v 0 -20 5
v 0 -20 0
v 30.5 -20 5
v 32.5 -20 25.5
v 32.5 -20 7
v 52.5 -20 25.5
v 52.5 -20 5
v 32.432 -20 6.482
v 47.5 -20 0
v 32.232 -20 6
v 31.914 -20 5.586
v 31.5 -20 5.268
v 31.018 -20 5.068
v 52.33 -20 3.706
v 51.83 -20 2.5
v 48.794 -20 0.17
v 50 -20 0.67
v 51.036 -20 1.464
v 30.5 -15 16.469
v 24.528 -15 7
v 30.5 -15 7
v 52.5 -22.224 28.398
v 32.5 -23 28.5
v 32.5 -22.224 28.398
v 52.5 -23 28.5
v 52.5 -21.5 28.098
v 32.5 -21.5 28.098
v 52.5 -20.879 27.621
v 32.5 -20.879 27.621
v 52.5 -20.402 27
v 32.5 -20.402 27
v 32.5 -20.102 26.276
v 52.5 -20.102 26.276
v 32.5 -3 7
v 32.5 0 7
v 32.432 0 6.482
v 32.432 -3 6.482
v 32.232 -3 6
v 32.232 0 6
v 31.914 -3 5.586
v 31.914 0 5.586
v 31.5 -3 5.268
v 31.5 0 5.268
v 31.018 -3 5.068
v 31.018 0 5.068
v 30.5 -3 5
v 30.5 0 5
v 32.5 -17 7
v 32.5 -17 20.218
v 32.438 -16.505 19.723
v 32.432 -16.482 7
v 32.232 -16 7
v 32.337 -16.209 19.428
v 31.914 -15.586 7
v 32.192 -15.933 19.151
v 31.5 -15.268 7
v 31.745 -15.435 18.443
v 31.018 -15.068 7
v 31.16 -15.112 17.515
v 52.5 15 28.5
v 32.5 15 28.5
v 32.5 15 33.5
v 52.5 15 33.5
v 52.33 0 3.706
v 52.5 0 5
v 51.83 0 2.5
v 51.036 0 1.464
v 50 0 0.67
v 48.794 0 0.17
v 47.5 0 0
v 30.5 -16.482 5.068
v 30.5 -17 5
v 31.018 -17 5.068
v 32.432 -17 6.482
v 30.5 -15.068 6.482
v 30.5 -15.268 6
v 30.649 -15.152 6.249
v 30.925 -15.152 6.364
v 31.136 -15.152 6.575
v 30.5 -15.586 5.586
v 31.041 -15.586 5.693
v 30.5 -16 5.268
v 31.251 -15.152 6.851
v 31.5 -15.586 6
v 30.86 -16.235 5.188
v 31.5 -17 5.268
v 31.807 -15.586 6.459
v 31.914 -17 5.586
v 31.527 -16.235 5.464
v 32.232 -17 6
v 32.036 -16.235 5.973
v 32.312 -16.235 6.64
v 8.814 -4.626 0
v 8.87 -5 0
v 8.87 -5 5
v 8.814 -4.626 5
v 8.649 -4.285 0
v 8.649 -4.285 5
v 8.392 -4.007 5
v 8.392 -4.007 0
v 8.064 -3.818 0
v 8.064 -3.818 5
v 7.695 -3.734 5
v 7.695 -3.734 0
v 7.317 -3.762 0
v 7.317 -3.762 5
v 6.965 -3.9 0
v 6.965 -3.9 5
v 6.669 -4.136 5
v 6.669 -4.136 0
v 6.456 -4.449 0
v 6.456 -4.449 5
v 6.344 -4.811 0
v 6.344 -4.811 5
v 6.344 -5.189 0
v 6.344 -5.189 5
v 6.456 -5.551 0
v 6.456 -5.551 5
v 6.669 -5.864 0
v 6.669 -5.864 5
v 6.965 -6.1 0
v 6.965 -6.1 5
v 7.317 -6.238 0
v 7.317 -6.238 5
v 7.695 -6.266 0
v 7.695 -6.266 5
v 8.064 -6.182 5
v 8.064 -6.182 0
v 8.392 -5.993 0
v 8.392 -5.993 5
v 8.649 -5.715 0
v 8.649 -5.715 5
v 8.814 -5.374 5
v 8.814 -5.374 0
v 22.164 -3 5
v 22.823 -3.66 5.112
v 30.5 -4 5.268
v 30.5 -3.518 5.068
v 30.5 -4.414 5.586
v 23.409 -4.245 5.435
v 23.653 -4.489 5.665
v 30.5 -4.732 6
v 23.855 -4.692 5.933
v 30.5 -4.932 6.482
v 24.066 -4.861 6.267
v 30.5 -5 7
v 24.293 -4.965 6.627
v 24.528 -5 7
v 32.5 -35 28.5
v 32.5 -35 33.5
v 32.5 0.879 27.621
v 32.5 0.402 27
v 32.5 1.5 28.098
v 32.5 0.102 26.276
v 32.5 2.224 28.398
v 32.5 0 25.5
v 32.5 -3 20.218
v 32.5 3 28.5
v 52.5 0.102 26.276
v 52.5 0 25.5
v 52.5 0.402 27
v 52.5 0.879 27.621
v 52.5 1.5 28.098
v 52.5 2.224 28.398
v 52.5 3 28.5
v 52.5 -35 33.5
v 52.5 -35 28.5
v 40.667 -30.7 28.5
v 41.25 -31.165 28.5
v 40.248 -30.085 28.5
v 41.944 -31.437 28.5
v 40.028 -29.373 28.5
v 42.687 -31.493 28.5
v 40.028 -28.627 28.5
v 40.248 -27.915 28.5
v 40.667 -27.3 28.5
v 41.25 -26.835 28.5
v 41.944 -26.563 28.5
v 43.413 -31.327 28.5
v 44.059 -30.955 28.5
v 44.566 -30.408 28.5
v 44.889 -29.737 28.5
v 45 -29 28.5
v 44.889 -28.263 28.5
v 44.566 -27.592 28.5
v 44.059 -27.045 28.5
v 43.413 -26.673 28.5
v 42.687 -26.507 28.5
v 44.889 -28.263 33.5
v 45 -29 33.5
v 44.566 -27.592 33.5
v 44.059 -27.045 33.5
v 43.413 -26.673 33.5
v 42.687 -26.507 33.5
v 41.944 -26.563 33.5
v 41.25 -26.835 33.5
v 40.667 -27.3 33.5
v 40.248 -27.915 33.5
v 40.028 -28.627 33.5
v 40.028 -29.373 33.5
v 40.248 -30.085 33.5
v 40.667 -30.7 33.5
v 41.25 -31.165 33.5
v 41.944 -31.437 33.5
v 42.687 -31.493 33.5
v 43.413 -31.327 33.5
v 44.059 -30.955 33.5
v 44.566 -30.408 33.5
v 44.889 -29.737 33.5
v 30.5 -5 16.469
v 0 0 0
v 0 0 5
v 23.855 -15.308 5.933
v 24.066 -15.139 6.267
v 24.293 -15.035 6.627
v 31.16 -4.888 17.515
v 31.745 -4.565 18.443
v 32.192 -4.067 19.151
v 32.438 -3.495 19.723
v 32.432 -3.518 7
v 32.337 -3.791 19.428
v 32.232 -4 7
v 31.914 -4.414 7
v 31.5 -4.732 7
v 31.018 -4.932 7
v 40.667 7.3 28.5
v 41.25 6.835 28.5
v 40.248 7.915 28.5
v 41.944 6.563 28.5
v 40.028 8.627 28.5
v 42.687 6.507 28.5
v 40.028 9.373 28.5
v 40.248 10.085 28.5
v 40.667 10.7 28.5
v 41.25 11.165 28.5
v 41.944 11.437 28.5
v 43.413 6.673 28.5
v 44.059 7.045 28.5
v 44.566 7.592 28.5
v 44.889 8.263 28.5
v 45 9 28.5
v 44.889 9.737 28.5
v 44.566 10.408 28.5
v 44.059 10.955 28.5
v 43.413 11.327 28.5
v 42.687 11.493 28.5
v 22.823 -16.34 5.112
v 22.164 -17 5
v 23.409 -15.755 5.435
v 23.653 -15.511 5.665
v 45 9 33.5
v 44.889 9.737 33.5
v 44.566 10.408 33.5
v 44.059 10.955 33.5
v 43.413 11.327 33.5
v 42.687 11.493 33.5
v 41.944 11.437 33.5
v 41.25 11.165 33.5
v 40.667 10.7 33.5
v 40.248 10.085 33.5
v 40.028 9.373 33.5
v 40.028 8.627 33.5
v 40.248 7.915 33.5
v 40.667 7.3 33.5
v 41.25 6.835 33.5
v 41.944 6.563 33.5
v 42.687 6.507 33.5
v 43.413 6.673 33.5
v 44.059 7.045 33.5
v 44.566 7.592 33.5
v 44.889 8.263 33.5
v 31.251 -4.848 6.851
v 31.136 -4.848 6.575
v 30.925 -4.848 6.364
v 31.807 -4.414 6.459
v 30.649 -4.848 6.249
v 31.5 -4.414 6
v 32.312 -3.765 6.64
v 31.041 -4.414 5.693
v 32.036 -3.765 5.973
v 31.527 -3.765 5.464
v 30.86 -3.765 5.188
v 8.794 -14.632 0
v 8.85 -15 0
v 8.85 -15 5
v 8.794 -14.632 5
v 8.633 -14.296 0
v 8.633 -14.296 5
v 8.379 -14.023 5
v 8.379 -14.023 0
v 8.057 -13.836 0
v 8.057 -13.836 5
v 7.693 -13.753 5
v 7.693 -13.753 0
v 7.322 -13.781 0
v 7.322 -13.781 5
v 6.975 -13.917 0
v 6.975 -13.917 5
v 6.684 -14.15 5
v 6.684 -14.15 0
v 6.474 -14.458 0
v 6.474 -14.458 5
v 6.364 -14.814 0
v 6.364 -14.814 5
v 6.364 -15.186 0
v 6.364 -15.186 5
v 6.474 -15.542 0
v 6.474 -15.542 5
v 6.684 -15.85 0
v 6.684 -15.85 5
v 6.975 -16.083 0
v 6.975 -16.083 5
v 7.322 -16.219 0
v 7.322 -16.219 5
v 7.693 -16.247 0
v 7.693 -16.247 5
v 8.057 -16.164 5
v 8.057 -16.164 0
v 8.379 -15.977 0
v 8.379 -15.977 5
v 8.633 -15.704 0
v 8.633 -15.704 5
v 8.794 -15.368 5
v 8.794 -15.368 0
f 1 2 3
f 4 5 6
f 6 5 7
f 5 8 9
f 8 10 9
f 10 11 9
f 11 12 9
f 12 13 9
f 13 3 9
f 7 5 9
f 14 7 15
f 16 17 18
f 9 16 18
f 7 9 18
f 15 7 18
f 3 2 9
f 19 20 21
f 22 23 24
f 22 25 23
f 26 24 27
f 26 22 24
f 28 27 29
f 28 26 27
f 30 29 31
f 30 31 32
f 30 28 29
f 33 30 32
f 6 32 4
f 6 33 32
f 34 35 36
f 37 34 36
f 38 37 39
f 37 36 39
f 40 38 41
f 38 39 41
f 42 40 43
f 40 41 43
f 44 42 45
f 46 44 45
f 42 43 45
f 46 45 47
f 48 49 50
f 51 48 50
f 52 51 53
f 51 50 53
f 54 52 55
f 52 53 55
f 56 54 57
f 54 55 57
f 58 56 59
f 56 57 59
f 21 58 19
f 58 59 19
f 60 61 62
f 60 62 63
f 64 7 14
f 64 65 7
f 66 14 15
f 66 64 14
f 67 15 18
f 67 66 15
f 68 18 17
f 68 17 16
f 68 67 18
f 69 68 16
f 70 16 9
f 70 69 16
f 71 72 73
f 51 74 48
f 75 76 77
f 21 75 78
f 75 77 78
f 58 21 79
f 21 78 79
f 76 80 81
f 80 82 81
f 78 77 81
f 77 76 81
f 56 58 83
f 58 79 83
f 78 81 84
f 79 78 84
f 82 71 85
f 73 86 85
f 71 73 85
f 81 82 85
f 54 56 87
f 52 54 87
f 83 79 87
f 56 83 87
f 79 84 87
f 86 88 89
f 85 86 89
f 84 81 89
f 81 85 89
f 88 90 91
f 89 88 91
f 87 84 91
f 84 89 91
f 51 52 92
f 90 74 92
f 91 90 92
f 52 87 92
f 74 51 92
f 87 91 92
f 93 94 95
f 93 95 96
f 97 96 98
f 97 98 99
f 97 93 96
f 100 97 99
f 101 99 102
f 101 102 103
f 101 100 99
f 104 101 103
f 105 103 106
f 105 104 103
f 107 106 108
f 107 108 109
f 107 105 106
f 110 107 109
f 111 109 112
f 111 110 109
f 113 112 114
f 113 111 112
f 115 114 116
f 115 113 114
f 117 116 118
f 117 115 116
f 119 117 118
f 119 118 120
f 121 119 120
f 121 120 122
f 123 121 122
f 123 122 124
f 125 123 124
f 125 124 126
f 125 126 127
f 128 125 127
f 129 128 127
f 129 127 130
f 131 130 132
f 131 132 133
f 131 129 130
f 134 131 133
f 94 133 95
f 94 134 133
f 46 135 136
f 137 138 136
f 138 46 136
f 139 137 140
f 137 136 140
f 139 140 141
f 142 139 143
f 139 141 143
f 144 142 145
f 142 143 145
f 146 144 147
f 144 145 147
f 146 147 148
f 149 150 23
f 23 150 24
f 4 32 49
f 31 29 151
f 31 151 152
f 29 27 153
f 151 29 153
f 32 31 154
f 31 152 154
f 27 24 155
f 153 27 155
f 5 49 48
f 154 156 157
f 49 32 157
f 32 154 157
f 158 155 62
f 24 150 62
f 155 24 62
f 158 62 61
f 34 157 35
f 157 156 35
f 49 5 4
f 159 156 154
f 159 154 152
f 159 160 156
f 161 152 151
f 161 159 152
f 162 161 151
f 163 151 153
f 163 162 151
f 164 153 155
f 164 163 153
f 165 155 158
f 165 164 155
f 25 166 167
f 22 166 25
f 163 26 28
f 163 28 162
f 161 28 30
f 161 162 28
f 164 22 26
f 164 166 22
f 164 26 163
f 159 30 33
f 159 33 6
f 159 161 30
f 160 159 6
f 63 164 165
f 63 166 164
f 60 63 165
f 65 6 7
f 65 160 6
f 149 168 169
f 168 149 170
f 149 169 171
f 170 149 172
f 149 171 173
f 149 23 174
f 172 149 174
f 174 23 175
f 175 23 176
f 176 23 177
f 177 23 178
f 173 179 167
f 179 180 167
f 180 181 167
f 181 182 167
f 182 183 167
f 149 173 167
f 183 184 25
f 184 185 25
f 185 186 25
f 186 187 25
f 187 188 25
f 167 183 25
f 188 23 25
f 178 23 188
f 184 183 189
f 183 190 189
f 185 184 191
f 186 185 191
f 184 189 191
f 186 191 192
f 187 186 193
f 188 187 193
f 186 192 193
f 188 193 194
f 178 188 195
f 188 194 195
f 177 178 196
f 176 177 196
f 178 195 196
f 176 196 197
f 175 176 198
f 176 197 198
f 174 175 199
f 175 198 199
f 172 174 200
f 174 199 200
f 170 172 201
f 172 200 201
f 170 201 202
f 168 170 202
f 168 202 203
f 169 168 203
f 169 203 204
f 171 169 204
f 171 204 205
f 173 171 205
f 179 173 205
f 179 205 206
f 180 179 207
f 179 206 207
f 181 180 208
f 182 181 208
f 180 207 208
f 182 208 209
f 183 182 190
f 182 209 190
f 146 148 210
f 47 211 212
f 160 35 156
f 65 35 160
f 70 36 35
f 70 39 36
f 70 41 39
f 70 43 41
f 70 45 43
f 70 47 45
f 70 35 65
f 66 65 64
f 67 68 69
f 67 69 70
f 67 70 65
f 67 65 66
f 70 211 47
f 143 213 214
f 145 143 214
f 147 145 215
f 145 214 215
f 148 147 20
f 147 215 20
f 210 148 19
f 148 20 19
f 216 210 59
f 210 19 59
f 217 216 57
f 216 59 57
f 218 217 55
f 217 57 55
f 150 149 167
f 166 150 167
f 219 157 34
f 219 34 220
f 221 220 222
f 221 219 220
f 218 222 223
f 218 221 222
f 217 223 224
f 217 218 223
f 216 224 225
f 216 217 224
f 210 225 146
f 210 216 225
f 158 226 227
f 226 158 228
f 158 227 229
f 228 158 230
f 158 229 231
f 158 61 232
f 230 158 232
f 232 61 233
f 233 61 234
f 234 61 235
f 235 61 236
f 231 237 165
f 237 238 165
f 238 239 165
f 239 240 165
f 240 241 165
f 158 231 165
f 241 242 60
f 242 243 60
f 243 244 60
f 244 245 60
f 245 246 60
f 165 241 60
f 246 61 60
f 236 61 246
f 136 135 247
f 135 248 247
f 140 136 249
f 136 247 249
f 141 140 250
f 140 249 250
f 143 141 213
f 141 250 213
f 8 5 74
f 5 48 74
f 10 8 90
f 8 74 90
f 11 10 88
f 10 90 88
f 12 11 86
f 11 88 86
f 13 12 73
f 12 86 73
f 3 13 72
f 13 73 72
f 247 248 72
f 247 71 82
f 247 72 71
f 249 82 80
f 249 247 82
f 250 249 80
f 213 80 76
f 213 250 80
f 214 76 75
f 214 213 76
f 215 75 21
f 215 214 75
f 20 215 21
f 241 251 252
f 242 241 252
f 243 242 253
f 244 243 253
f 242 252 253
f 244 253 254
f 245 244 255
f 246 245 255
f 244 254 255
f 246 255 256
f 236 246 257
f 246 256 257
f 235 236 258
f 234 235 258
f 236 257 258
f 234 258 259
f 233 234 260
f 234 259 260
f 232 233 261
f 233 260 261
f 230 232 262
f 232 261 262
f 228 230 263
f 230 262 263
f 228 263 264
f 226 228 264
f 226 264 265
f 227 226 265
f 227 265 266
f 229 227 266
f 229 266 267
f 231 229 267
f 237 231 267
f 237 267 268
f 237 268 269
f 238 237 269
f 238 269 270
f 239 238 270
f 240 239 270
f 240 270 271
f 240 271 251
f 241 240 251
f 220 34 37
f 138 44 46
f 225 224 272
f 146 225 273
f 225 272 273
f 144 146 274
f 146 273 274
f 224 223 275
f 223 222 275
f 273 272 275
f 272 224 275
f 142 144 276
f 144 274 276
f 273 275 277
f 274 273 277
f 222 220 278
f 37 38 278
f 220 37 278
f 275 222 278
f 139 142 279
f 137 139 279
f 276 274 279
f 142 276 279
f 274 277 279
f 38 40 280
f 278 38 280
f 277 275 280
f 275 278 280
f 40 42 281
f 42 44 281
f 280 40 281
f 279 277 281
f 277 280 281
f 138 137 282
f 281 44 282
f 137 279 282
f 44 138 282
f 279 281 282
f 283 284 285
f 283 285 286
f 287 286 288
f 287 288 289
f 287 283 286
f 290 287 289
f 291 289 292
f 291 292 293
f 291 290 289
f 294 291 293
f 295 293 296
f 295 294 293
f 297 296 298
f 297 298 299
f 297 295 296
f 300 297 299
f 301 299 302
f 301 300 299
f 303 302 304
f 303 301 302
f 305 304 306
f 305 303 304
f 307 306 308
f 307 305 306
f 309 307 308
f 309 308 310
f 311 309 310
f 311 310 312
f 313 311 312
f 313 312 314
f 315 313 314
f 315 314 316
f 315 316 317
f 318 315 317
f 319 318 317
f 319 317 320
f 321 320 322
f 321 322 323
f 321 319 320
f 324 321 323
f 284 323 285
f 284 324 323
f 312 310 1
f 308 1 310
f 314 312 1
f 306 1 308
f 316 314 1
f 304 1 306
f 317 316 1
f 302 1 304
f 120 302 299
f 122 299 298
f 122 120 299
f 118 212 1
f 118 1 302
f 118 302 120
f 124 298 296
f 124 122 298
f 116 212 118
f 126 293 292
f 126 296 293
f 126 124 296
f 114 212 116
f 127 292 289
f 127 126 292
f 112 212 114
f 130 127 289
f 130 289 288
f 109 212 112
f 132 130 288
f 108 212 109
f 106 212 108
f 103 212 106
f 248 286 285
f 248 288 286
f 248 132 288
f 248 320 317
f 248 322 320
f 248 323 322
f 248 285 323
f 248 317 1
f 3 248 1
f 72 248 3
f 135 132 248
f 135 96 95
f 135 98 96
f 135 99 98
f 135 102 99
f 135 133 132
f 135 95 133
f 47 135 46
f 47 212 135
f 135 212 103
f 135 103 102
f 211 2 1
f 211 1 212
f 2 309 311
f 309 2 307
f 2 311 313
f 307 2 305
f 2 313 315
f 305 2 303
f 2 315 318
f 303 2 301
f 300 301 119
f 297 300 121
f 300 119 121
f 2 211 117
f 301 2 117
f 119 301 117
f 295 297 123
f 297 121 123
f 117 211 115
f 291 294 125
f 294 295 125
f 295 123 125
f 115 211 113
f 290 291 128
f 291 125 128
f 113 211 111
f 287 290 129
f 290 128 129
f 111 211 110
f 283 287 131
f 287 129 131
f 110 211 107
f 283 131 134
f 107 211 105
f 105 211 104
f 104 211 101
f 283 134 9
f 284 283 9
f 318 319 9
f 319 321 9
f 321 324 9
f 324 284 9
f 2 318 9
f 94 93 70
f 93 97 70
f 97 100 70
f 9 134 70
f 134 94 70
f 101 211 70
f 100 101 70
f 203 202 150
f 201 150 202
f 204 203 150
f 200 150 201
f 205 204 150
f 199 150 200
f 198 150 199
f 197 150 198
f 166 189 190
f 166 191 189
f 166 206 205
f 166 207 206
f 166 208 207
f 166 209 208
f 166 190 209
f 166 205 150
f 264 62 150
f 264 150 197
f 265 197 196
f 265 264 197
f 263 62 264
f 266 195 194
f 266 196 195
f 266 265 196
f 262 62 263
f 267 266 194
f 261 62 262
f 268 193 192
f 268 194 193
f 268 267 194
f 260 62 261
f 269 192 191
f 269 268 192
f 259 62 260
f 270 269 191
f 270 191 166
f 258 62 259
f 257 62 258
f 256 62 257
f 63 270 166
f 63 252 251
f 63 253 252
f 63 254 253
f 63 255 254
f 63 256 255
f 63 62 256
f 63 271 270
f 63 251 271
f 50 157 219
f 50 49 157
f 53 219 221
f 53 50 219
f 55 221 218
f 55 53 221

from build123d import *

# Parameters (mm, degrees)
SKETCH_1_W          = 52.5
SKETCH_1_H          = 20
SKETCH_1_R          = 1.27
SKETCH_1_R_2        = 1.25
EXTRUDE_1_DEPTH     = 5
SKETCH_2_W          = 20
SKETCH_2_H          = 20
EXTRUDE_2_DEPTH     = 28.5
SKETCH_4_W          = 20
SKETCH_4_H          = 5
EXTRUDE_3_DEPTH     = 25
SKETCH_5_R          = 2.5
CUT_EXTRUDE_1_DEPTH = 18
FILLET_1_R          = 3
RIB_1_REACH         = 69.108
SKETCH_6_WALL_W     = 153.524907632
SKETCH_6_WALL_H     = 10
FILLET_2_R          = 5
FILLET_3_R          = 2


with BuildPart() as part:
    # 草图1 → 凸台-拉伸1 (new body)
    with BuildSketch(Plane.XY):
        with Locations((26.25, -10)):
            Rectangle(SKETCH_1_W, SKETCH_1_H)
        with Locations((7.6, -5)):
            Circle(SKETCH_1_R, mode=Mode.SUBTRACT)
        with Locations((7.6, -15)):
            Circle(SKETCH_1_R_2, mode=Mode.SUBTRACT)
    extrude(amount=EXTRUDE_1_DEPTH)

    # 草图2 → 凸台-拉伸2 (add)
    with BuildSketch(Plane.XY.offset(5)):
        with Locations((42.5, -10)):
            Rectangle(SKETCH_2_W, SKETCH_2_H)
    extrude(amount=EXTRUDE_2_DEPTH)

    # 草图4 → 凸台-拉伸3 (add, symmetric)
    with BuildSketch(Plane(origin=(0, -10, 0), x_dir=(1, 0, 0), z_dir=(0, 1, 0))):
        with Locations((42.5, -31)):
            Rectangle(SKETCH_4_W, SKETCH_4_H)
    extrude(amount=EXTRUDE_3_DEPTH, both=True)

    # 草图5 → 切除-拉伸1 (cut, symmetric)
    with BuildSketch(Plane.XY.offset(33.5)):
        with Locations((42.5, 9)):
            Circle(SKETCH_5_R)
        with Locations((42.5, -29)):
            Circle(SKETCH_5_R)
    extrude(amount=CUT_EXTRUDE_1_DEPTH, both=True, mode=Mode.SUBTRACT)

    # 圆角1
    fillet_1_edges = [part.edges().sort_by_distance(p)[0] for p in [
        (42.5, -20, 28.5),
        (42.5, 0, 28.5),
    ]]
    fillet(fillet_1_edges, radius=FILLET_1_R)

    # 草图6 wall → 筋1 (add, up to next)
    with BuildSketch(Plane(origin=(27.883344013, -10, 12.320105985), x_dir=(0.533450292048, 0, 0.845831416959), z_dir=(0.845831416959, 0, -0.533450292048)), mode=Mode.PRIVATE) as rib_1_sk1:
        Rectangle(SKETCH_6_WALL_W, SKETCH_6_WALL_H)
    rib_1_tool1 = extrude(rib_1_sk1.sketch, amount=RIB_1_REACH, mode=Mode.PRIVATE) - part.part
    add(rib_1_tool1.solids().sort_by_distance((27.883344013, -10, 12.320105985))[0])

    # 圆角2
    fillet_2_edges = [part.edges().sort_by_distance(p)[0] for p in [
        (52.5, -10, 0),
    ]]
    fillet(fillet_2_edges, radius=FILLET_2_R)

    # 圆角3
    fillet_3_edges = [part.edges().sort_by_distance(p)[0] for p in [
        (32.5, -2.5, 5),
        (32.5, -17.5, 5),
        (23.266688025, -10, 5),
        (32.5, -5, 12.320105985),
        (27.883344013, -15, 5),
        (32.5, -10, 19.640211969),
        (27.883344013, -5, 5),
        (32.5, -15, 12.320105985),
    ]]
    fillet(fillet_3_edges, radius=FILLET_3_R)


solid = part.part
